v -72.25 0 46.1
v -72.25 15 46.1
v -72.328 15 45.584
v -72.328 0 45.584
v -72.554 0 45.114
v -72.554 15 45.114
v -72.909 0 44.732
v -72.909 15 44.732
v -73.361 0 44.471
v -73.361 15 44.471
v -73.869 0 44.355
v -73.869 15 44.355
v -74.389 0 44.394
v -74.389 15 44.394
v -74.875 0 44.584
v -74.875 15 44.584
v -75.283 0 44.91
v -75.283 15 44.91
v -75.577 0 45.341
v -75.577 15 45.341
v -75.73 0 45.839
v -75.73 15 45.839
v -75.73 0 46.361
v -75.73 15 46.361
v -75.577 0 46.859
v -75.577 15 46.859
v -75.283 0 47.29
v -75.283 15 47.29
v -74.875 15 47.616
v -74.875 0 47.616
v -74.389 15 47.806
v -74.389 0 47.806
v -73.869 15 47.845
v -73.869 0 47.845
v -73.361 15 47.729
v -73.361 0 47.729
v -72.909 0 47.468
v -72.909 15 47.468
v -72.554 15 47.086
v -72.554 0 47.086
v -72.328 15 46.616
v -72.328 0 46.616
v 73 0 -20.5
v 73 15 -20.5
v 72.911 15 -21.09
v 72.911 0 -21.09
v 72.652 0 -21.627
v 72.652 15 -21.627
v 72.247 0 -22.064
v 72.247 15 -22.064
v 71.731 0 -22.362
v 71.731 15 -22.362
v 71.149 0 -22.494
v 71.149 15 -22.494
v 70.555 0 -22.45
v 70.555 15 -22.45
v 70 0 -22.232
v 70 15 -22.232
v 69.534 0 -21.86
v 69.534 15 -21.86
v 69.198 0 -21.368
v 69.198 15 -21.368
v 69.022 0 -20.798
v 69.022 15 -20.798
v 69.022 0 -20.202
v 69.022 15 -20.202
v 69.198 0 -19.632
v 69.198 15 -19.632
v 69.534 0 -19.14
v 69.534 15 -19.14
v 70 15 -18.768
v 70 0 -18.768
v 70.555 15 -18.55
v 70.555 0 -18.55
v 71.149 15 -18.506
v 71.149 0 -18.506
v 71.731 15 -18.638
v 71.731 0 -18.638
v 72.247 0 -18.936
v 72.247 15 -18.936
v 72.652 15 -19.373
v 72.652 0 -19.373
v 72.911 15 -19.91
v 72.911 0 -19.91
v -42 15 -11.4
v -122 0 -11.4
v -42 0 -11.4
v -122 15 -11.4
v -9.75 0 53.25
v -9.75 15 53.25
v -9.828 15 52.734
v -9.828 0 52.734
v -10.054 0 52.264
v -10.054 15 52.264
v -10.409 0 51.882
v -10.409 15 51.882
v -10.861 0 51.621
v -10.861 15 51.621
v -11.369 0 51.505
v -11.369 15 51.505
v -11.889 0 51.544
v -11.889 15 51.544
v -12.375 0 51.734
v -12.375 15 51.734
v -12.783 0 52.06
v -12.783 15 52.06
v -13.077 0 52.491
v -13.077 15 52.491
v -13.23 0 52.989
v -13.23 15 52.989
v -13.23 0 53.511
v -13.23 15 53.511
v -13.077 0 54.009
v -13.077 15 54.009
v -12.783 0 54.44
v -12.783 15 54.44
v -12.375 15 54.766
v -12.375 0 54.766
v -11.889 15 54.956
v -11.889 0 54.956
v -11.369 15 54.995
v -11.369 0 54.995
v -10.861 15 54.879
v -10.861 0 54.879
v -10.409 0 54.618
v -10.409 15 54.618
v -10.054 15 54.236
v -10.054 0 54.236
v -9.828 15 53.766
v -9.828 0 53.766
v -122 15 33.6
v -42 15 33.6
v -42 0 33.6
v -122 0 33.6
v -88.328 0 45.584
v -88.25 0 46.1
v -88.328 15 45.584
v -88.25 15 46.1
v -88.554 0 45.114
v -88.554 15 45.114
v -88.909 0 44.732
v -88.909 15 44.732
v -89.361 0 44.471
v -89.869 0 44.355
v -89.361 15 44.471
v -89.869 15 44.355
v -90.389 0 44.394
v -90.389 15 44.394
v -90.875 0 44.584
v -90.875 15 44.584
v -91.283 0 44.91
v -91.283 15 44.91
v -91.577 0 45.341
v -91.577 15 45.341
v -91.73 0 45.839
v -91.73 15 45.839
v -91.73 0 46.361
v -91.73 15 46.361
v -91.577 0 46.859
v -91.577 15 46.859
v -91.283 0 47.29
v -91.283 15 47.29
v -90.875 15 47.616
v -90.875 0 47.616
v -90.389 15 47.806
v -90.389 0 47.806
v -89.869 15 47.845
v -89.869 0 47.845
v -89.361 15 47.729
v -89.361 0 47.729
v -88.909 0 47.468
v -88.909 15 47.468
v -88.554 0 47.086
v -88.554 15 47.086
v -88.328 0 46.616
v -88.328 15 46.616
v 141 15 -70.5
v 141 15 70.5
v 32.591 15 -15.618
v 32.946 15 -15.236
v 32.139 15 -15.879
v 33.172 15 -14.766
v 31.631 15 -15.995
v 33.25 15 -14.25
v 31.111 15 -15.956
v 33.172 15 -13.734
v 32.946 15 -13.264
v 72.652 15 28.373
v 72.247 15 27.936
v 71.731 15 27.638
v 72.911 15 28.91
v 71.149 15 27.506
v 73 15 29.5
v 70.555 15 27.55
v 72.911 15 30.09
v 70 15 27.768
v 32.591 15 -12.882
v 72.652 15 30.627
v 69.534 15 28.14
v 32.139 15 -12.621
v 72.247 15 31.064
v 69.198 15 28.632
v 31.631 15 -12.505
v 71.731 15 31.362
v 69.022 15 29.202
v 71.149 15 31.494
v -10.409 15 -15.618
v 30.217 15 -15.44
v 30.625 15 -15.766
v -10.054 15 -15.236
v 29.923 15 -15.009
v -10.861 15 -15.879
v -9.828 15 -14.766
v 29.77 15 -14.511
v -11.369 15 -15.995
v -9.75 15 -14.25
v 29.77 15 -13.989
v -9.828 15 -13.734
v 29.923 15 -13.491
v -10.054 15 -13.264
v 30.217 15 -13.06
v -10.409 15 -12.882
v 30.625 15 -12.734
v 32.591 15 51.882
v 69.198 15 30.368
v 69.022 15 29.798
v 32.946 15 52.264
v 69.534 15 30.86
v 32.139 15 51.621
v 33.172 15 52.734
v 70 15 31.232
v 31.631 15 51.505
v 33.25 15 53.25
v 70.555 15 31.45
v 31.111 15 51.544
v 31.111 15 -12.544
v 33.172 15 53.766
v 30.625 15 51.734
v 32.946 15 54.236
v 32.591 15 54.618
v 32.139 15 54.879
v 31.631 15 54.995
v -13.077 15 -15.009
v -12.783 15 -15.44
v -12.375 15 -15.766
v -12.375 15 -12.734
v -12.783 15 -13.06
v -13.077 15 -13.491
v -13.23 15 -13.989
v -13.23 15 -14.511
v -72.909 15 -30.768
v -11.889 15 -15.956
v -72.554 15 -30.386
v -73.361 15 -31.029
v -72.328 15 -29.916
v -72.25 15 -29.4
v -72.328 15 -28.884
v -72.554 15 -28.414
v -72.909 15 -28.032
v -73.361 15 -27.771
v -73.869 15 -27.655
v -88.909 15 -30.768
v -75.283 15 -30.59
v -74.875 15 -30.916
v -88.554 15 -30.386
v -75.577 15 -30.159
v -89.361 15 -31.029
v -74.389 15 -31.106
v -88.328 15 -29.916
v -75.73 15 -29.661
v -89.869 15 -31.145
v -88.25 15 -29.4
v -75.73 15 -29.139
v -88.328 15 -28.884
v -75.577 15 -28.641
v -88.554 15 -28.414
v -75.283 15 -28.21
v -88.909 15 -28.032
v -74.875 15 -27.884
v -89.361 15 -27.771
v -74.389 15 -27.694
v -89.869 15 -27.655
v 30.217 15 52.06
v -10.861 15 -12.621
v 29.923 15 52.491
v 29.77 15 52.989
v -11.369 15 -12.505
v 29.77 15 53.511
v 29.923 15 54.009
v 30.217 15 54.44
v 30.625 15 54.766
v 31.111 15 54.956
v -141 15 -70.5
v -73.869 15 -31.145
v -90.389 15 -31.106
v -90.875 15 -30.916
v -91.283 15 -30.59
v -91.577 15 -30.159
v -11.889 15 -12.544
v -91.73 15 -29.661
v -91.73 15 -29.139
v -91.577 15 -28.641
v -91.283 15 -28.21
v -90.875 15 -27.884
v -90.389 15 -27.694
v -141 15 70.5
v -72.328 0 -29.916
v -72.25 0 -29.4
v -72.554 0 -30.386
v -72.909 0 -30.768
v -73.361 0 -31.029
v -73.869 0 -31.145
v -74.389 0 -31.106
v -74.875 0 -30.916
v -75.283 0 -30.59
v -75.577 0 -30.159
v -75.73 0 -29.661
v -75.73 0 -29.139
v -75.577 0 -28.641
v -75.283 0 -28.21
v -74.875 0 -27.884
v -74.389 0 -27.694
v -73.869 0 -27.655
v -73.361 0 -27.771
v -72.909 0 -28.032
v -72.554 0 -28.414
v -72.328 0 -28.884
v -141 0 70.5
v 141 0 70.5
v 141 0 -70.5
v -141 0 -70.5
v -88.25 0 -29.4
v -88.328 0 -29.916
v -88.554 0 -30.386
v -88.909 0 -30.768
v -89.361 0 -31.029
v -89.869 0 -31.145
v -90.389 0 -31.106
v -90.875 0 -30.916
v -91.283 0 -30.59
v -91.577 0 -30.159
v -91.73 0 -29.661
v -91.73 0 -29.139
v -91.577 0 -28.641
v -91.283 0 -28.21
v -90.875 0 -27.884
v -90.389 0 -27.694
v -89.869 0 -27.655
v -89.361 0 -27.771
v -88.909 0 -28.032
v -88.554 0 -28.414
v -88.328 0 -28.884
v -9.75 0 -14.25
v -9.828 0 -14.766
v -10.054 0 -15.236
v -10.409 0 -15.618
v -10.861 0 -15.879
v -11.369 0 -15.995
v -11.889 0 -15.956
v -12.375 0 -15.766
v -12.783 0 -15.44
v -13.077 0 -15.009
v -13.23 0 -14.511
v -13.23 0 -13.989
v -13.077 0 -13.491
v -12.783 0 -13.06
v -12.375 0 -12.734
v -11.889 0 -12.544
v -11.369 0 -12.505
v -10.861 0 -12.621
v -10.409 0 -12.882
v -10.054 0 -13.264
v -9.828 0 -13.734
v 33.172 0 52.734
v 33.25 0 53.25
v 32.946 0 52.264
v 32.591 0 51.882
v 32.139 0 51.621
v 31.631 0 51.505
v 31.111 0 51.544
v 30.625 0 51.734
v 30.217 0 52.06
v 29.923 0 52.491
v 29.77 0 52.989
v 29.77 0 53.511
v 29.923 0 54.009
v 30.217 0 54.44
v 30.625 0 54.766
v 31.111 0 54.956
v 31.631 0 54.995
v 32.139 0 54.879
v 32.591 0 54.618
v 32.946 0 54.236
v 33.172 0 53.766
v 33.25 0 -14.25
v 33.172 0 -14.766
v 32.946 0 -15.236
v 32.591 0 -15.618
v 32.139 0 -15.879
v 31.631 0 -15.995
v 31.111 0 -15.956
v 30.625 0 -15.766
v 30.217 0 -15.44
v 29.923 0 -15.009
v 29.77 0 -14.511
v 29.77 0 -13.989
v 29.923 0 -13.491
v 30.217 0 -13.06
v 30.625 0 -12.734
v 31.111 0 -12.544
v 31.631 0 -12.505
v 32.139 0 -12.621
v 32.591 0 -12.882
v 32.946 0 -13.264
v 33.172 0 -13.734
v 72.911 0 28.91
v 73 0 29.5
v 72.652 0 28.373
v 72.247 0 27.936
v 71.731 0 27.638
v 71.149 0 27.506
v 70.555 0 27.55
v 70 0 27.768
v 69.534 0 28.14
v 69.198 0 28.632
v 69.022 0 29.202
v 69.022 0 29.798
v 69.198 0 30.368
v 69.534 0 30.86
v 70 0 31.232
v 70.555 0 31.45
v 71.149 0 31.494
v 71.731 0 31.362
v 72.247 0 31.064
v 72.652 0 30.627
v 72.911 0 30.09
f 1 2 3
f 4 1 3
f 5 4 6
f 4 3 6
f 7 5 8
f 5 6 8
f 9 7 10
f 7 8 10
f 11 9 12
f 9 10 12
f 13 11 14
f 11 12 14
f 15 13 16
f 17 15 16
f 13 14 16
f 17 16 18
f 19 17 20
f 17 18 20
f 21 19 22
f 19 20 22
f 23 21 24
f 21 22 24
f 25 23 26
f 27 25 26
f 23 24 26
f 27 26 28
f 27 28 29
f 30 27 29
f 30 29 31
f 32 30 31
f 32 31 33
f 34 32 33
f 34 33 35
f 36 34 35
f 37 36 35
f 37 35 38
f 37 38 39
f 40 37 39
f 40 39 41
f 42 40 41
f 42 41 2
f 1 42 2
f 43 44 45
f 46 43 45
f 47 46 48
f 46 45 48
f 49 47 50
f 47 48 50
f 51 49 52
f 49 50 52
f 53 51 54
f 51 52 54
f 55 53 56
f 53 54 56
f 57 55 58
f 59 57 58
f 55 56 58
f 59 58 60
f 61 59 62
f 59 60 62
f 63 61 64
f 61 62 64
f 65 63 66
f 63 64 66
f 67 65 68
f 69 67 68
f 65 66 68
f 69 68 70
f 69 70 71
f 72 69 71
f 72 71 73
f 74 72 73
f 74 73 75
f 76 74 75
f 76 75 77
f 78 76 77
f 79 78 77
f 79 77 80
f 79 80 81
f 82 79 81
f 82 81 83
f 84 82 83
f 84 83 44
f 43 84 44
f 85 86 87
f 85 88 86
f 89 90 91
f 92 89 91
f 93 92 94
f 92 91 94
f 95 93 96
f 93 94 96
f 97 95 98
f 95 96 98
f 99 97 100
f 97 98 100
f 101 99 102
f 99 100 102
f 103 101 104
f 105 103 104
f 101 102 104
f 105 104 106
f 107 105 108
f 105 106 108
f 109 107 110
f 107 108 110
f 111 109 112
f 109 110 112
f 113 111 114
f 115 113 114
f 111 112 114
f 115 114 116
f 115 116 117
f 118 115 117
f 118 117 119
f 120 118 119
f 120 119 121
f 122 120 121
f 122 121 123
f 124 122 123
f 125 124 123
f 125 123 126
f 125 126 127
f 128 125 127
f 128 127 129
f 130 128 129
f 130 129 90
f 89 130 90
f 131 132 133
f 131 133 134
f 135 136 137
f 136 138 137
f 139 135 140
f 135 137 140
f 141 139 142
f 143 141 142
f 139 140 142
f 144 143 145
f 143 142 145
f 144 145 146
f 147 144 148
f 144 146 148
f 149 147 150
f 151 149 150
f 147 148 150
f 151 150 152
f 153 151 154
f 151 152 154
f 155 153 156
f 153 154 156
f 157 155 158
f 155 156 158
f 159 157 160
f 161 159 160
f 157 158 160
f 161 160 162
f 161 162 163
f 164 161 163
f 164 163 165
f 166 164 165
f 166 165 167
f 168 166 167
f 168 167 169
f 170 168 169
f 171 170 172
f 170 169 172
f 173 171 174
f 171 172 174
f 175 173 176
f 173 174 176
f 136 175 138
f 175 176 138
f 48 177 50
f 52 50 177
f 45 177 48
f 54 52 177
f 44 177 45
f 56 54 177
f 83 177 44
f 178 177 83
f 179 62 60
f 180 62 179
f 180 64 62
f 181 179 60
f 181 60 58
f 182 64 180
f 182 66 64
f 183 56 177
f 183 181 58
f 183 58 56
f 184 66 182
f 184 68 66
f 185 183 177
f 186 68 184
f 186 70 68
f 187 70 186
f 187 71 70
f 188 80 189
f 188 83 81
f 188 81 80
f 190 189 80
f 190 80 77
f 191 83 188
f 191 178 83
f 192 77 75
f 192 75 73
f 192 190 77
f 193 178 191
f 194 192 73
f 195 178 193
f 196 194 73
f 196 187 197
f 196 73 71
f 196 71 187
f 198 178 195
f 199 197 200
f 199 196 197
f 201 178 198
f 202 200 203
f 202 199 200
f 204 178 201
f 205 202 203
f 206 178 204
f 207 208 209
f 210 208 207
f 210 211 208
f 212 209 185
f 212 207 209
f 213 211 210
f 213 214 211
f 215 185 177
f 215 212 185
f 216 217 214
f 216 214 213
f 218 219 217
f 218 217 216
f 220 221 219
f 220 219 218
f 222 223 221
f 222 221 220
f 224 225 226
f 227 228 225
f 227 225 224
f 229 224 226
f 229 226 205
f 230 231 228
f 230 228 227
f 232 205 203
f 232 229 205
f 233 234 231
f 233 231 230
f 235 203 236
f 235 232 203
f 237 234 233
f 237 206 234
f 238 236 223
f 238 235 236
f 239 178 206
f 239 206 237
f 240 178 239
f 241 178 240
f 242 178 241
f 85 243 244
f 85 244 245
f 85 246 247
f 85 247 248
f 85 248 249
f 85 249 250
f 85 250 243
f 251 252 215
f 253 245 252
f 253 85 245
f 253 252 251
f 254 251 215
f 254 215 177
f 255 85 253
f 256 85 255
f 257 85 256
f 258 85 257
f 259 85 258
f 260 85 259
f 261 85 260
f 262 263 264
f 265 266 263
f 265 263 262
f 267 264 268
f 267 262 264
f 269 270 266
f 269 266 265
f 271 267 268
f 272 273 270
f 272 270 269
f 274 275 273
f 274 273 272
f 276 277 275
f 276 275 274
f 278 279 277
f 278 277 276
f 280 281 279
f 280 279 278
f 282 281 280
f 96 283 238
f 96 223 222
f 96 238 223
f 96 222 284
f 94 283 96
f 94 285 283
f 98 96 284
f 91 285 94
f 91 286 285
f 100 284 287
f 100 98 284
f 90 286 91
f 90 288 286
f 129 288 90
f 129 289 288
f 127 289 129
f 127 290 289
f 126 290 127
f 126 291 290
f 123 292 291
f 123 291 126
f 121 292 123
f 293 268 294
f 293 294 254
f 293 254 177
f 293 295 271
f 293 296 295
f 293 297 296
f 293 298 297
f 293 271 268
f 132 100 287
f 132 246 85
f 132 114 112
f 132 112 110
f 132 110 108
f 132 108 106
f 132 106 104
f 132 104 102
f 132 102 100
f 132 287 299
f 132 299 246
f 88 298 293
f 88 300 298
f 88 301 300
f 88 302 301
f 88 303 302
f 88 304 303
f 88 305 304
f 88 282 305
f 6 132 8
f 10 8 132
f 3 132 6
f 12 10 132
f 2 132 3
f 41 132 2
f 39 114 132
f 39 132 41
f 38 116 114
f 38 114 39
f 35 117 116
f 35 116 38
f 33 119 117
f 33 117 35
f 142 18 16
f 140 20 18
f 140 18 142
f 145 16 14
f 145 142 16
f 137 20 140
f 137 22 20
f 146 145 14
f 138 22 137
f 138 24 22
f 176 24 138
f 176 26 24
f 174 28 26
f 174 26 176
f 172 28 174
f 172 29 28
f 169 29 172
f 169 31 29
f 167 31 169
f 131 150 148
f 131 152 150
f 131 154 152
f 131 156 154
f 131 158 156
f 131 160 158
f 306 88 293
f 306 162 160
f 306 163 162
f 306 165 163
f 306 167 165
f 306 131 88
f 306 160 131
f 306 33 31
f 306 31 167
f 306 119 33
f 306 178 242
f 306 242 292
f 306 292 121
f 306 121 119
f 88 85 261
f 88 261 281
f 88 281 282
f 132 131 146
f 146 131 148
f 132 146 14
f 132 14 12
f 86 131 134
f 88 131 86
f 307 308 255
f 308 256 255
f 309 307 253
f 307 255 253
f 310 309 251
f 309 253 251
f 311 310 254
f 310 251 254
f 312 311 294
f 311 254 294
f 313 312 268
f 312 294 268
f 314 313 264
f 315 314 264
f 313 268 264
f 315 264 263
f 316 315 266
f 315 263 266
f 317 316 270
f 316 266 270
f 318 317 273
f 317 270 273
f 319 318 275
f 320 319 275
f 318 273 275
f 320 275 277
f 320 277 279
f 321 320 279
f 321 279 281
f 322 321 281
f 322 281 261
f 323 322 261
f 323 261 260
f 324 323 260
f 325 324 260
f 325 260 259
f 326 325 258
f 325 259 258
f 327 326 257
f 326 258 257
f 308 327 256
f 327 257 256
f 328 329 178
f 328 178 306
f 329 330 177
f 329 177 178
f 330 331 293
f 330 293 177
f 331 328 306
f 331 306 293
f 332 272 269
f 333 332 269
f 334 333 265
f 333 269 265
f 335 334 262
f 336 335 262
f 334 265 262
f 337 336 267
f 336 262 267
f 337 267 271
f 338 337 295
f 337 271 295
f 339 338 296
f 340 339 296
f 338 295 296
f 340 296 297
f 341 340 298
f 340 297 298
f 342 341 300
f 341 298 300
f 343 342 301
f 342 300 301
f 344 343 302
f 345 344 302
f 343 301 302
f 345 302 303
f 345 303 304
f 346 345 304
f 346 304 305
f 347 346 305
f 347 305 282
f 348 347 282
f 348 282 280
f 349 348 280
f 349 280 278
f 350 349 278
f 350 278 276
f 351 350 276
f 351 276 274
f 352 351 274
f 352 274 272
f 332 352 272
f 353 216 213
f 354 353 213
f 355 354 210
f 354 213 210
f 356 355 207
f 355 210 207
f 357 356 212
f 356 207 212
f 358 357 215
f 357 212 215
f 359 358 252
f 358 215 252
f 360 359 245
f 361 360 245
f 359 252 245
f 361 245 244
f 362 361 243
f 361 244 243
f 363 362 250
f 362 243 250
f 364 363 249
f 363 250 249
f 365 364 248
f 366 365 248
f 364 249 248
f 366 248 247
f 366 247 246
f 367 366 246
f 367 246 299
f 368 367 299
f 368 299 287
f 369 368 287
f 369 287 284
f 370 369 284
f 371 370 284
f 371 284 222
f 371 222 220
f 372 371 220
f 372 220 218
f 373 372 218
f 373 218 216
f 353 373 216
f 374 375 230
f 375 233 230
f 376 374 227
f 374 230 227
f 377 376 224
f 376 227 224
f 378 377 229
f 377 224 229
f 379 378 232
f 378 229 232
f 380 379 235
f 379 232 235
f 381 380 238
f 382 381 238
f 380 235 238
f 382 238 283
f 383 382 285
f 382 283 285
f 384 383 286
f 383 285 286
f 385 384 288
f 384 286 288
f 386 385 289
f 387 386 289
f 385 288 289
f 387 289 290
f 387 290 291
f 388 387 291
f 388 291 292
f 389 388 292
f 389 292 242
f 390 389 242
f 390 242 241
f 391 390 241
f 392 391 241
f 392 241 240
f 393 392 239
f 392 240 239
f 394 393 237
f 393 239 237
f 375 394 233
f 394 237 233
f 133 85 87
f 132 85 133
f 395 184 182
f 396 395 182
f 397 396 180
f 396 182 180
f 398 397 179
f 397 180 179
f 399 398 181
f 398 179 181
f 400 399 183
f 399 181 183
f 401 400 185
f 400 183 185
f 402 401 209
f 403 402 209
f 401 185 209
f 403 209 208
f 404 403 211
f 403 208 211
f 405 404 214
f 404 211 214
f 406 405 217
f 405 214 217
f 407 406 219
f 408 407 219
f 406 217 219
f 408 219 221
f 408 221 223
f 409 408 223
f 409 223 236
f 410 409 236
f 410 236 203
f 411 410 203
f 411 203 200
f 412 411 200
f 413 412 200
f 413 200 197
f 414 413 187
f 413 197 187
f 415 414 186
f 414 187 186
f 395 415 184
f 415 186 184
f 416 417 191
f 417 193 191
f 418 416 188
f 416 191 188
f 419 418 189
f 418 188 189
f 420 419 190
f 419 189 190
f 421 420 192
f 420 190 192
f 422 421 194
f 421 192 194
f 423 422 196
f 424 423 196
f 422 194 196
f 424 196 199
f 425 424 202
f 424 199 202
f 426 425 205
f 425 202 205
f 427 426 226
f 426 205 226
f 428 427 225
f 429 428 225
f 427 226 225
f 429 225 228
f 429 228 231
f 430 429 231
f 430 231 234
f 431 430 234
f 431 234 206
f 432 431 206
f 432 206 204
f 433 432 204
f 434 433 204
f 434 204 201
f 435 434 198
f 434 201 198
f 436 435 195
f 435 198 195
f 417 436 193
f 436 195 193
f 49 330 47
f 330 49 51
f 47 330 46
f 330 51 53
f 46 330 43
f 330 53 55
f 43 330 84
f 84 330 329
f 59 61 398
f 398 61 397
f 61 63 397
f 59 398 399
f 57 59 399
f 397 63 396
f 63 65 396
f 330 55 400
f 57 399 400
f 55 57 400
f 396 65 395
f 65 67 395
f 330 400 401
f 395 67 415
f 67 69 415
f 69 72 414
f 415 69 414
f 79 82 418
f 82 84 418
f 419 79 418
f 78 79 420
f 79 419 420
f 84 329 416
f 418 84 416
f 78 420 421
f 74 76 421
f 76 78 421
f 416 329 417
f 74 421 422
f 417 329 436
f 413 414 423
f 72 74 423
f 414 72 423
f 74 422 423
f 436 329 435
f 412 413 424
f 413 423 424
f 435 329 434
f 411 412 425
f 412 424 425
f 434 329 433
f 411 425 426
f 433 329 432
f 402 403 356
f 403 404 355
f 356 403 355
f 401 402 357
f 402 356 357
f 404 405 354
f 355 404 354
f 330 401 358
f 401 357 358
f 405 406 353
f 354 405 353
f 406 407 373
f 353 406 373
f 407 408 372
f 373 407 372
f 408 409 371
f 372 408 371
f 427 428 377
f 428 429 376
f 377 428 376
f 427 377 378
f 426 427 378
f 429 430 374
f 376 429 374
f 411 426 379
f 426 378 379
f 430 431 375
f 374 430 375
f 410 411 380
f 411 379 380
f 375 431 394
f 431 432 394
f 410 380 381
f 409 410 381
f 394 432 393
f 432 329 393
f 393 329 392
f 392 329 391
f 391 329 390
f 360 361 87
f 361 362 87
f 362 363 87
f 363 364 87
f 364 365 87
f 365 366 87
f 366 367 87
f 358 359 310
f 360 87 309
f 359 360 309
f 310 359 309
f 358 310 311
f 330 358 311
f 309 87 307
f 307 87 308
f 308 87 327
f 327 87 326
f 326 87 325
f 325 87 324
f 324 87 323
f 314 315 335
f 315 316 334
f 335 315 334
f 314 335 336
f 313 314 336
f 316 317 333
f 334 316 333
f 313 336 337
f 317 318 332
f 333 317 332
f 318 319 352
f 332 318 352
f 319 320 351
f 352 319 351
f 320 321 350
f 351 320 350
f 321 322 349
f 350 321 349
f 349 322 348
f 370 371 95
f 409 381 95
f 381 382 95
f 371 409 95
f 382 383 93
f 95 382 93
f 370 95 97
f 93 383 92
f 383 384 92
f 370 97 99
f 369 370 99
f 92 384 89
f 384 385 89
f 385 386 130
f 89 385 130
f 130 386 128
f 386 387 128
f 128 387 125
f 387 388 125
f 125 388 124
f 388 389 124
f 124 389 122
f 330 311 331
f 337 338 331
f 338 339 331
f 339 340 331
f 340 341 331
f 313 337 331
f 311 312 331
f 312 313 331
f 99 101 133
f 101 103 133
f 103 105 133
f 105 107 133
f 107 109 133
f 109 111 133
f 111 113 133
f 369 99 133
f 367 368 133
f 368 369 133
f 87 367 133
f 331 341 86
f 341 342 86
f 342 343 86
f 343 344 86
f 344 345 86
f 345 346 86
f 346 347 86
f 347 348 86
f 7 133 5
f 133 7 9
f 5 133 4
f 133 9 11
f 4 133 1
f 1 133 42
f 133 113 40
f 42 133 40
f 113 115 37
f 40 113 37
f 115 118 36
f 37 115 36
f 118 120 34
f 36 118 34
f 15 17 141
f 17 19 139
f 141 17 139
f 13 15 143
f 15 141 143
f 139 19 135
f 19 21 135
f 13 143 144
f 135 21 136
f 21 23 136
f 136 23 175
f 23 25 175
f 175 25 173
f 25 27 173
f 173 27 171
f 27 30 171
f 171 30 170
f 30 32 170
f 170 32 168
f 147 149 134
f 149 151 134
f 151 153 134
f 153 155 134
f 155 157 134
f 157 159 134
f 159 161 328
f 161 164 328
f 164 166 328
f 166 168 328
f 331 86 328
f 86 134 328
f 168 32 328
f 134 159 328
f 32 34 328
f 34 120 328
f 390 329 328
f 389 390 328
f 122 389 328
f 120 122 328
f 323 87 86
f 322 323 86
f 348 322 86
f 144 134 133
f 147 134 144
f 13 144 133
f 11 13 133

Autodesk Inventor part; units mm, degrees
ref_plane "YZ Plane" through (0, 0, 0) normal (1, 0, 0) x (0, 1, 0)
ref_plane "XZ Plane" through (0, 0, 0) normal (0, 1, 0) x (-1, 0, 0)
ref_plane "XY Plane" through (0, 0, 0) normal (0, 0, 1) x (1, 0, 0)
sketch "Sketch1" plane through (0, 0, 0) normal (0, 1, 0) x (-1, 0, 0)
  line L0 (141, -70.5) -> (-141, -70.5)
  line L1 (-141, -70.5) -> (-141, 70.5)
  line L2 (-141, 70.5) -> (141, 70.5)
  line L3 (141, 70.5) -> (141, -70.5)
  line L4 (141, -70.5) -> (-141, 70.5) construction
  line L5 (-141, -70.5) -> (141, 70.5) construction
  point P0 (0, 0)
  dimension "d0" = 282
  dimension "d1" = 141
extrude "RectangleFace" add sketch "Sketch1" along normal blind 15
sketch "Sketch2" plane through (0, 15, 0) normal (0, 1, 0) x (1, 0, 0)
  line L0 (141, 70.5) -> (-141, 70.5) projected
  line L1 (0, 70.5) -> (0, -11.1)
  line L2 (0, -11.1) -> (-82, -11.1)
  line L3 (-122, 11.4) -> (-42, 11.4)
  line L4 (-42, 11.4) -> (-42, -33.6)
  line L5 (-42, -33.6) -> (-122, -33.6)
  line L6 (-122, -33.6) -> (-122, 11.4)
  line L7 (-122, 11.4) -> (-42, -33.6) construction
  line L8 (-42, 11.4) -> (-122, -33.6) construction
  point P0 (0, 0)
  dimension "d4" = 81.6
  dimension "d5" = 82
  dimension "d6" = 80
  dimension "d7" = 45
extrude "RectangularCut" cut sketch "Sketch2" against normal blind 15
sketch "Sketch3" plane through (0, 15, 0) normal (0, 1, 0) x (1, 0, 0)
  line L0 (-42, 11.4) -> (-122, 11.4) projected
  line L1 (-82, 11.4) -> (-82, 29.4)
  line L2 (-122, -33.6) -> (-42, -33.6) projected
  line L3 (-82, -33.6) -> (-82, -46.1)
  line L4 (-82, 29.4) -> (-74, 29.4)
  line L5 (-82, 29.4) -> (-90, 29.4)
  line L6 (-82, -46.1) -> (-74, -46.1)
  line L7 (-82, -46.1) -> (-90, -46.1)
  circle A0 centre (-74, -46.1) radius 1.75
  circle A1 centre (-90, -46.1) radius 1.75
  circle A2 centre (-74, 29.4) radius 1.75
  circle A3 centre (-90, 29.4) radius 1.75
  point P0 (0, 0)
  dimension "d10" = 18
  dimension "d11" = 12.5
  dimension "d12" = 8
  dimension "d13" = 8
  dimension "d14" = 8
  dimension "d15" = 8
  dimension "d16" = 3.5
  dimension "d17" = 3.5
  dimension "d18" = 3.5
  dimension "d19" = 3.5
extrude "AxleSupportHoles" cut sketch "Sketch3" against normal blind 15
sketch "Sketch4" plane through (0, 15, 0) normal (0, 1, 0) x (1, 0, 0)
  line L0 (141, 70.5) -> (-141, 70.5) projected
  line L1 (0, 70.5) -> (0, -19.5)
  line L2 (0, -19.5) -> (10, -19.5)
  line L3 (-15.5, 18.25) -> (35.5, 18.25)
  line L4 (35.5, 18.25) -> (35.5, -57.25)
  line L5 (35.5, -57.25) -> (-15.5, -57.25)
  line L6 (-15.5, -57.25) -> (-15.5, 18.25)
  line L7 (-15.5, 18.25) -> (35.5, -57.25) construction
  line L8 (35.5, 18.25) -> (-15.5, -57.25) construction
  line L9 (-15.5, 18.25) -> (-11.5, 18.25)
  line L10 (-11.5, 18.25) -> (-11.5, 14.25)
  line L11 (35.5, 18.25) -> (31.5, 18.25)
  line L12 (31.5, 18.25) -> (31.5, 14.25)
  line L13 (-15.5, -57.25) -> (-11.5, -57.25)
  line L14 (-11.5, -57.25) -> (-11.5, -53.25)
  line L15 (35.5, -57.25) -> (31.5, -57.25)
  line L16 (31.5, -57.25) -> (31.5, -53.25)
  circle A0 centre (-11.5, -53.25) radius 1.75
  circle A1 centre (31.5, -53.25) radius 1.75
  circle A2 centre (31.5, 14.25) radius 1.75
  circle A3 centre (-11.5, 14.25) radius 1.75
  point P0 (0, 0)
  dimension "d22" = 90
  dimension "d23" = 10
  dimension "d24" = 51
  dimension "d25" = 75.5
  dimension "d26" = 4
  dimension "d27" = 4
  dimension "d28" = 4
  dimension "d29" = 4
  dimension "d30" = 4
  dimension "d31" = 4
  dimension "d32" = 4
  dimension "d33" = 4
  dimension "d34" = 3.5
  dimension "d35" = 3.5
  dimension "d36" = 3.5
  dimension "d37" = 3.5
extrude "DriverHoles" cut sketch "Sketch4" against normal blind 15 contours A0 | A1 | A2 | A3
sketch "Sketch5" plane through (0, 15, 0) normal (0, 1, 0) x (1, 0, 0)
  line L0 (141, 70.5) -> (71, 70.5)
  line L1 (141, 70.5) -> (-141, 70.5) projected
  line L2 (71, 70.5) -> (71, 20.5)
  line L3 (71, 20.5) -> (71, -29.5)
  circle A0 centre (71, 20.5) radius 2
  circle A1 centre (71, -29.5) radius 2
  point P0 (0, 0)
  dimension "d40" = 70
  dimension "d41" = 50
  dimension "d42" = 50
  dimension "d43" = 4
  dimension "d44" = 4
extrude "Extrusion5" cut sketch "Sketch5" against normal blind 15
properties part number "RectangleFifteen1"
